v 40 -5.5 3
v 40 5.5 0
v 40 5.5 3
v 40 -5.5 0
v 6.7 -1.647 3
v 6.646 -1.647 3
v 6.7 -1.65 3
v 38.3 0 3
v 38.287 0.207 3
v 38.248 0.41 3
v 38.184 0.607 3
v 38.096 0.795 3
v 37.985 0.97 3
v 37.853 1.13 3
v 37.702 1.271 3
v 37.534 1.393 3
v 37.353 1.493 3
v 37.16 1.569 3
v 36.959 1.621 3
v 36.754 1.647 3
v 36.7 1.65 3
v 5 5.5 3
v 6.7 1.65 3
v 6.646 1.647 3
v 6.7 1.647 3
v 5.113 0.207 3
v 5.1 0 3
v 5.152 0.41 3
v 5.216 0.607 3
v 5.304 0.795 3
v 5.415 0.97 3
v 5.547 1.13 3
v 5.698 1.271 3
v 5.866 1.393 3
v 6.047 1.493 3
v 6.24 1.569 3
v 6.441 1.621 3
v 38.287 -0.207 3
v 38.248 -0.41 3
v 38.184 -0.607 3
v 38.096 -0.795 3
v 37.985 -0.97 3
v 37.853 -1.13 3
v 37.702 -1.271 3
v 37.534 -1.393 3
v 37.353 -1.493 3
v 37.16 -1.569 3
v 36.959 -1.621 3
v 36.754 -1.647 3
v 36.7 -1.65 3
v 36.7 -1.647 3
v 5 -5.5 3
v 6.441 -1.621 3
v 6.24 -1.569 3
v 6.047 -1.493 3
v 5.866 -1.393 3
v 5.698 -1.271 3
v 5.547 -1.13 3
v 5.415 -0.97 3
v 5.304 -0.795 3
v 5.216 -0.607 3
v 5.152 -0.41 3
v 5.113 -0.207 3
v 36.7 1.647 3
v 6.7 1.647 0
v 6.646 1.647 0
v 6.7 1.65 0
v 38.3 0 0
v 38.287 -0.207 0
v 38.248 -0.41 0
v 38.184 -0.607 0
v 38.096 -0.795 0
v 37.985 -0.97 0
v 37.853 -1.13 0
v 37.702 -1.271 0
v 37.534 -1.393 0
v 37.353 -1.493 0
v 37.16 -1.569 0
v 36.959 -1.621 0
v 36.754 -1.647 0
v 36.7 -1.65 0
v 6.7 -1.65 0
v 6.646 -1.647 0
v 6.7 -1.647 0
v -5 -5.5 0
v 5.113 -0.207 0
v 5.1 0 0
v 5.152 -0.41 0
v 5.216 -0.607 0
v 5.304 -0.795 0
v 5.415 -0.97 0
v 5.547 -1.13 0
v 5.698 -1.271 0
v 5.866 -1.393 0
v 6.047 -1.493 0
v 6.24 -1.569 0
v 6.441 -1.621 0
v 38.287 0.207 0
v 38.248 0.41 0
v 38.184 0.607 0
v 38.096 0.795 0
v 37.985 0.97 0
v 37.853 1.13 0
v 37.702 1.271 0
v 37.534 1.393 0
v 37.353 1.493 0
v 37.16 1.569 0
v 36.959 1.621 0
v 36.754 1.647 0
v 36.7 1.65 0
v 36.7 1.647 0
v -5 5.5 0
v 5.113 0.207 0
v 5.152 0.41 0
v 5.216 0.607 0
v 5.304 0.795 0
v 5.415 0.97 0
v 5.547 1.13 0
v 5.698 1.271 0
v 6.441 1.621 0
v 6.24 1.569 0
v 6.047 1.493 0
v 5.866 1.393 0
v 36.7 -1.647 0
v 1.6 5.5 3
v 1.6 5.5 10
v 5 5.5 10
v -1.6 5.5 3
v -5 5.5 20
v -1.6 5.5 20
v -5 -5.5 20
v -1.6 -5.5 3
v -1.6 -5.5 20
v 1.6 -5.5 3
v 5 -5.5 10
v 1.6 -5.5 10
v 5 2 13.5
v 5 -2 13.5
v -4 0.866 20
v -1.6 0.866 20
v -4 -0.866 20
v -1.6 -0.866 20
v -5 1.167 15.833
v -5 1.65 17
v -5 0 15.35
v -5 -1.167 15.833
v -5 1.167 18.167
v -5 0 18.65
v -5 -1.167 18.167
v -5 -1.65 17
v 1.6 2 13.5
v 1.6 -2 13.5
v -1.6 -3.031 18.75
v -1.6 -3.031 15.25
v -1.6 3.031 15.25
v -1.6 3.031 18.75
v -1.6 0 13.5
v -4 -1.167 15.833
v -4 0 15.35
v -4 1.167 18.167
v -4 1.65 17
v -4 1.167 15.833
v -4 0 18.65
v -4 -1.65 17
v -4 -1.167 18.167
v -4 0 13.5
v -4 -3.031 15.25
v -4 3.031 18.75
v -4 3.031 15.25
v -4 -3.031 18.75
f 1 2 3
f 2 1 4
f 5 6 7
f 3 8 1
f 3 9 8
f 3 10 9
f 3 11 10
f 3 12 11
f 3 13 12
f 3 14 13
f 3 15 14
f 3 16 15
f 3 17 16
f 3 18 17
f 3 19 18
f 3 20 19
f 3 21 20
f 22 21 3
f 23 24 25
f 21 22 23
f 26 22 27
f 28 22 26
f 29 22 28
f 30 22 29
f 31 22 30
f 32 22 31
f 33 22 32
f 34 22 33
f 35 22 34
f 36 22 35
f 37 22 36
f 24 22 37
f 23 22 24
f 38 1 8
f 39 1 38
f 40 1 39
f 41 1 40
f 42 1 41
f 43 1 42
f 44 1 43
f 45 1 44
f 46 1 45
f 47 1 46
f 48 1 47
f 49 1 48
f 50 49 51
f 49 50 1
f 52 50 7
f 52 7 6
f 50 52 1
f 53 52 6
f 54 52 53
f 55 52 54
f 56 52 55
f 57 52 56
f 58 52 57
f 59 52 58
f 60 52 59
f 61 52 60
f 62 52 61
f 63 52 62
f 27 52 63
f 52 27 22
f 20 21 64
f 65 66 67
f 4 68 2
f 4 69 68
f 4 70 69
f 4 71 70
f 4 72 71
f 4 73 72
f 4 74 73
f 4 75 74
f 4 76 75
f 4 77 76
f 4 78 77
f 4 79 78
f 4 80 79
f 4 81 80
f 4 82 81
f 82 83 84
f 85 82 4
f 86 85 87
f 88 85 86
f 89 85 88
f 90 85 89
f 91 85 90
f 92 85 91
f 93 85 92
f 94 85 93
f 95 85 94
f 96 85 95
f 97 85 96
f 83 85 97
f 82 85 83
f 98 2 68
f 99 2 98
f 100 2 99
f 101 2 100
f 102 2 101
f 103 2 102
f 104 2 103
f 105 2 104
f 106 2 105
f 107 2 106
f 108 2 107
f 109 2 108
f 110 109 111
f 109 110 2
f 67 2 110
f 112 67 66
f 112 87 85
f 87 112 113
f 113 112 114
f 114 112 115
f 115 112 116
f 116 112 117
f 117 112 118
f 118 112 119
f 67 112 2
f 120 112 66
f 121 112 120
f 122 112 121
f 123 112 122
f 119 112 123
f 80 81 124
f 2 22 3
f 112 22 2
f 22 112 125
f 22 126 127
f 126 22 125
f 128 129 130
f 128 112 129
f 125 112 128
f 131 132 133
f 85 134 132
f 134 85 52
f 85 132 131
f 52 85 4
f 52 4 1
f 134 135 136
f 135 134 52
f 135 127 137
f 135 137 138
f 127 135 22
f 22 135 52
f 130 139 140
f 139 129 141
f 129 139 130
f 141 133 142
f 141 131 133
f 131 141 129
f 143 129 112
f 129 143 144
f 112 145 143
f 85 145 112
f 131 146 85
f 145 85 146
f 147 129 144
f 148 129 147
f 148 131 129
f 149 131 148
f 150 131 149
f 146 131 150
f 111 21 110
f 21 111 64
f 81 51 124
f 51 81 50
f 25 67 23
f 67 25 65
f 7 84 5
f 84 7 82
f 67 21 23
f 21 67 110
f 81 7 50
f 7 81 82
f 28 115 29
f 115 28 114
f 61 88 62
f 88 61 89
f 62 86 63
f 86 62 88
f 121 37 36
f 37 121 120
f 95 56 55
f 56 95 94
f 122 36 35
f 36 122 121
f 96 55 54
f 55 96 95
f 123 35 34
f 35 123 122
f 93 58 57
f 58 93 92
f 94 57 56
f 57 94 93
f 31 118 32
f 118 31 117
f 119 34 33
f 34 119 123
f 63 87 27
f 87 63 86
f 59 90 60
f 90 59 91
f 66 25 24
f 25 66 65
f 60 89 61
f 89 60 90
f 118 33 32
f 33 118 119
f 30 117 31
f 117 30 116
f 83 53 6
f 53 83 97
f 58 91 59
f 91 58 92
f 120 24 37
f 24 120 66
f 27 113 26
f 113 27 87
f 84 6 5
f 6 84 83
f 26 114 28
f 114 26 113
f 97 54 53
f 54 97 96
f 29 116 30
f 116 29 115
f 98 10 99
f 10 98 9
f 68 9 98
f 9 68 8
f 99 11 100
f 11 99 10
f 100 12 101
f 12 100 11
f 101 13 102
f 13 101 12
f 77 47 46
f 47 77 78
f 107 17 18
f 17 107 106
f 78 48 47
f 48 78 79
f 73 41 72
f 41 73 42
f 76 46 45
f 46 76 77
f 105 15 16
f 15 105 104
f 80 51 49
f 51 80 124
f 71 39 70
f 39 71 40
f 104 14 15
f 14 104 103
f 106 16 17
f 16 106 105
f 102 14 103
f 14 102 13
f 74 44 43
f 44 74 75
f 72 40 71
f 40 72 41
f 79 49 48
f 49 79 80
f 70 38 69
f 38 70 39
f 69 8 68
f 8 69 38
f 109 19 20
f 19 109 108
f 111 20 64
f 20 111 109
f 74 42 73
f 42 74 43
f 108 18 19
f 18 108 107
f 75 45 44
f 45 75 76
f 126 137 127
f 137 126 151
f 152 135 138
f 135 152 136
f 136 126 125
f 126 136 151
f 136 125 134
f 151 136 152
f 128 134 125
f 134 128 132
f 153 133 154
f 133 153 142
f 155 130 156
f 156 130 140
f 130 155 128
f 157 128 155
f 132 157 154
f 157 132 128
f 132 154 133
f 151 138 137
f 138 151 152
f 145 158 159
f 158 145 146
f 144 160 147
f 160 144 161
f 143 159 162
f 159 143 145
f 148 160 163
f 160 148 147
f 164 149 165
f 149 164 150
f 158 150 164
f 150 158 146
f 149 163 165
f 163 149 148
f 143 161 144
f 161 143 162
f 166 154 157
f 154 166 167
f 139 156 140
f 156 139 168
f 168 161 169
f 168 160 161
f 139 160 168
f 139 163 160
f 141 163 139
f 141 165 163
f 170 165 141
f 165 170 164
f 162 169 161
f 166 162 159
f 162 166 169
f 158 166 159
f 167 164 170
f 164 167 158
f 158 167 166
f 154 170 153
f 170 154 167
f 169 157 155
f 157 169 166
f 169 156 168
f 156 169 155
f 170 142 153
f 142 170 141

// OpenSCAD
// Robot DC-motor: sensor keyesIR - holder

// Vertical part.
h_vert = 40;
w_vert = 11;
d_vert =  3;

// Internal diameter of nut.
id_nut = 3.3;

// Out diameter of nut.
od_nut = 7;

// Height of nut.
h_nut = 4;

// Length and diameter of screws.
len_screw = 20;
dia_screw = 3.3;

// Horizontal part.
h_horiz = 10;
w_horiz = 11;
d_horiz =  20;

// Width of chassis.
w_chassis = 3.2;

// Vertical hole.
h_vhole = h_vert - 2*id_nut - (h_horiz - w_chassis)/2;
w_vhole = id_nut;
d_vhole =  10;

// Width of chassis.
w_chassis = 3.2;

// Horizontal hole.
h_hhole = w_chassis;
w_hhole = w_horiz+1;
d_hhole = d_horiz;

// Block of nut.
h_nut_hole = (h_horiz - w_chassis)/2 + 1;
w_nut_hole = w_horiz+1;
d_nut_hole = od_nut;


module solid_part() {
  union() {
// Vertical part.
    translate([h_vert/2, 0, d_vert/2])
      cube([h_vert, w_vert, d_vert], center = true);
    
// Horizontal part.
    translate([0, 0, d_horiz/2])
      cube([h_horiz, w_horiz, d_horiz], center = true);
  }    
}    

module  holes() {
    
  union() {    
// Vertical hole.
    translate([h_vhole/2 + id_nut + (h_horiz - w_chassis)/2, 0, d_vhole/2 - 0.5])  
      cube([h_vhole, w_vhole, d_vhole], center = true);
    translate([(h_vhole/2 + (h_horiz - w_chassis)/2-d_vhole-w_vhole/2),0,0])
        cylinder(r=w_vhole/2, h=d_vhole, center=true, $fn = 50);
    translate([(h_vhole/2 + (h_horiz - w_chassis)/2+d_vhole+w_vhole/2+ id_nut*2),0,0])
        cylinder(r=w_vhole/2, h=d_vhole, center=true, $fn = 50); 
     
    translate([0,w_vert/2,d_vert*2+4])
      rotate([45,0,0])
        cube([6,6,6]);
    translate([0,-w_vert/2,d_vert*2+4])
      rotate([45,0,0])
        cube([6,6,6]);
    
// Horizontal hole.
    translate([0, 0, d_horiz/2 + d_vert])
      cube([h_hhole, w_hhole, d_hhole], center = true);  

// Block of nut.
    translate([(h_horiz - w_chassis)/2, 0, d_horiz/2 + d_nut_hole])
      cube([h_nut_hole, w_nut_hole, d_nut_hole], center = true);  

// Screw hole.
    translate([0, 0, d_horiz/2 + d_nut_hole])
      rotate(a=[0,90,0])      
        cylinder(h = len_screw, r1 = dia_screw/2, r2 = dia_screw/2, $fn = 8, center = true);      
        

// Nut hole.
    translate([-h_nut/2, 0, d_horiz/2 + d_nut_hole])
      rotate(a=[ 0, 90, 0])      
        cylinder(h = h_nut, r1 = od_nut/2, r2 = od_nut/2, $fn = 6, center = true);      
  }      

}

difference() {
  solid_part();
  holes();  
} 
